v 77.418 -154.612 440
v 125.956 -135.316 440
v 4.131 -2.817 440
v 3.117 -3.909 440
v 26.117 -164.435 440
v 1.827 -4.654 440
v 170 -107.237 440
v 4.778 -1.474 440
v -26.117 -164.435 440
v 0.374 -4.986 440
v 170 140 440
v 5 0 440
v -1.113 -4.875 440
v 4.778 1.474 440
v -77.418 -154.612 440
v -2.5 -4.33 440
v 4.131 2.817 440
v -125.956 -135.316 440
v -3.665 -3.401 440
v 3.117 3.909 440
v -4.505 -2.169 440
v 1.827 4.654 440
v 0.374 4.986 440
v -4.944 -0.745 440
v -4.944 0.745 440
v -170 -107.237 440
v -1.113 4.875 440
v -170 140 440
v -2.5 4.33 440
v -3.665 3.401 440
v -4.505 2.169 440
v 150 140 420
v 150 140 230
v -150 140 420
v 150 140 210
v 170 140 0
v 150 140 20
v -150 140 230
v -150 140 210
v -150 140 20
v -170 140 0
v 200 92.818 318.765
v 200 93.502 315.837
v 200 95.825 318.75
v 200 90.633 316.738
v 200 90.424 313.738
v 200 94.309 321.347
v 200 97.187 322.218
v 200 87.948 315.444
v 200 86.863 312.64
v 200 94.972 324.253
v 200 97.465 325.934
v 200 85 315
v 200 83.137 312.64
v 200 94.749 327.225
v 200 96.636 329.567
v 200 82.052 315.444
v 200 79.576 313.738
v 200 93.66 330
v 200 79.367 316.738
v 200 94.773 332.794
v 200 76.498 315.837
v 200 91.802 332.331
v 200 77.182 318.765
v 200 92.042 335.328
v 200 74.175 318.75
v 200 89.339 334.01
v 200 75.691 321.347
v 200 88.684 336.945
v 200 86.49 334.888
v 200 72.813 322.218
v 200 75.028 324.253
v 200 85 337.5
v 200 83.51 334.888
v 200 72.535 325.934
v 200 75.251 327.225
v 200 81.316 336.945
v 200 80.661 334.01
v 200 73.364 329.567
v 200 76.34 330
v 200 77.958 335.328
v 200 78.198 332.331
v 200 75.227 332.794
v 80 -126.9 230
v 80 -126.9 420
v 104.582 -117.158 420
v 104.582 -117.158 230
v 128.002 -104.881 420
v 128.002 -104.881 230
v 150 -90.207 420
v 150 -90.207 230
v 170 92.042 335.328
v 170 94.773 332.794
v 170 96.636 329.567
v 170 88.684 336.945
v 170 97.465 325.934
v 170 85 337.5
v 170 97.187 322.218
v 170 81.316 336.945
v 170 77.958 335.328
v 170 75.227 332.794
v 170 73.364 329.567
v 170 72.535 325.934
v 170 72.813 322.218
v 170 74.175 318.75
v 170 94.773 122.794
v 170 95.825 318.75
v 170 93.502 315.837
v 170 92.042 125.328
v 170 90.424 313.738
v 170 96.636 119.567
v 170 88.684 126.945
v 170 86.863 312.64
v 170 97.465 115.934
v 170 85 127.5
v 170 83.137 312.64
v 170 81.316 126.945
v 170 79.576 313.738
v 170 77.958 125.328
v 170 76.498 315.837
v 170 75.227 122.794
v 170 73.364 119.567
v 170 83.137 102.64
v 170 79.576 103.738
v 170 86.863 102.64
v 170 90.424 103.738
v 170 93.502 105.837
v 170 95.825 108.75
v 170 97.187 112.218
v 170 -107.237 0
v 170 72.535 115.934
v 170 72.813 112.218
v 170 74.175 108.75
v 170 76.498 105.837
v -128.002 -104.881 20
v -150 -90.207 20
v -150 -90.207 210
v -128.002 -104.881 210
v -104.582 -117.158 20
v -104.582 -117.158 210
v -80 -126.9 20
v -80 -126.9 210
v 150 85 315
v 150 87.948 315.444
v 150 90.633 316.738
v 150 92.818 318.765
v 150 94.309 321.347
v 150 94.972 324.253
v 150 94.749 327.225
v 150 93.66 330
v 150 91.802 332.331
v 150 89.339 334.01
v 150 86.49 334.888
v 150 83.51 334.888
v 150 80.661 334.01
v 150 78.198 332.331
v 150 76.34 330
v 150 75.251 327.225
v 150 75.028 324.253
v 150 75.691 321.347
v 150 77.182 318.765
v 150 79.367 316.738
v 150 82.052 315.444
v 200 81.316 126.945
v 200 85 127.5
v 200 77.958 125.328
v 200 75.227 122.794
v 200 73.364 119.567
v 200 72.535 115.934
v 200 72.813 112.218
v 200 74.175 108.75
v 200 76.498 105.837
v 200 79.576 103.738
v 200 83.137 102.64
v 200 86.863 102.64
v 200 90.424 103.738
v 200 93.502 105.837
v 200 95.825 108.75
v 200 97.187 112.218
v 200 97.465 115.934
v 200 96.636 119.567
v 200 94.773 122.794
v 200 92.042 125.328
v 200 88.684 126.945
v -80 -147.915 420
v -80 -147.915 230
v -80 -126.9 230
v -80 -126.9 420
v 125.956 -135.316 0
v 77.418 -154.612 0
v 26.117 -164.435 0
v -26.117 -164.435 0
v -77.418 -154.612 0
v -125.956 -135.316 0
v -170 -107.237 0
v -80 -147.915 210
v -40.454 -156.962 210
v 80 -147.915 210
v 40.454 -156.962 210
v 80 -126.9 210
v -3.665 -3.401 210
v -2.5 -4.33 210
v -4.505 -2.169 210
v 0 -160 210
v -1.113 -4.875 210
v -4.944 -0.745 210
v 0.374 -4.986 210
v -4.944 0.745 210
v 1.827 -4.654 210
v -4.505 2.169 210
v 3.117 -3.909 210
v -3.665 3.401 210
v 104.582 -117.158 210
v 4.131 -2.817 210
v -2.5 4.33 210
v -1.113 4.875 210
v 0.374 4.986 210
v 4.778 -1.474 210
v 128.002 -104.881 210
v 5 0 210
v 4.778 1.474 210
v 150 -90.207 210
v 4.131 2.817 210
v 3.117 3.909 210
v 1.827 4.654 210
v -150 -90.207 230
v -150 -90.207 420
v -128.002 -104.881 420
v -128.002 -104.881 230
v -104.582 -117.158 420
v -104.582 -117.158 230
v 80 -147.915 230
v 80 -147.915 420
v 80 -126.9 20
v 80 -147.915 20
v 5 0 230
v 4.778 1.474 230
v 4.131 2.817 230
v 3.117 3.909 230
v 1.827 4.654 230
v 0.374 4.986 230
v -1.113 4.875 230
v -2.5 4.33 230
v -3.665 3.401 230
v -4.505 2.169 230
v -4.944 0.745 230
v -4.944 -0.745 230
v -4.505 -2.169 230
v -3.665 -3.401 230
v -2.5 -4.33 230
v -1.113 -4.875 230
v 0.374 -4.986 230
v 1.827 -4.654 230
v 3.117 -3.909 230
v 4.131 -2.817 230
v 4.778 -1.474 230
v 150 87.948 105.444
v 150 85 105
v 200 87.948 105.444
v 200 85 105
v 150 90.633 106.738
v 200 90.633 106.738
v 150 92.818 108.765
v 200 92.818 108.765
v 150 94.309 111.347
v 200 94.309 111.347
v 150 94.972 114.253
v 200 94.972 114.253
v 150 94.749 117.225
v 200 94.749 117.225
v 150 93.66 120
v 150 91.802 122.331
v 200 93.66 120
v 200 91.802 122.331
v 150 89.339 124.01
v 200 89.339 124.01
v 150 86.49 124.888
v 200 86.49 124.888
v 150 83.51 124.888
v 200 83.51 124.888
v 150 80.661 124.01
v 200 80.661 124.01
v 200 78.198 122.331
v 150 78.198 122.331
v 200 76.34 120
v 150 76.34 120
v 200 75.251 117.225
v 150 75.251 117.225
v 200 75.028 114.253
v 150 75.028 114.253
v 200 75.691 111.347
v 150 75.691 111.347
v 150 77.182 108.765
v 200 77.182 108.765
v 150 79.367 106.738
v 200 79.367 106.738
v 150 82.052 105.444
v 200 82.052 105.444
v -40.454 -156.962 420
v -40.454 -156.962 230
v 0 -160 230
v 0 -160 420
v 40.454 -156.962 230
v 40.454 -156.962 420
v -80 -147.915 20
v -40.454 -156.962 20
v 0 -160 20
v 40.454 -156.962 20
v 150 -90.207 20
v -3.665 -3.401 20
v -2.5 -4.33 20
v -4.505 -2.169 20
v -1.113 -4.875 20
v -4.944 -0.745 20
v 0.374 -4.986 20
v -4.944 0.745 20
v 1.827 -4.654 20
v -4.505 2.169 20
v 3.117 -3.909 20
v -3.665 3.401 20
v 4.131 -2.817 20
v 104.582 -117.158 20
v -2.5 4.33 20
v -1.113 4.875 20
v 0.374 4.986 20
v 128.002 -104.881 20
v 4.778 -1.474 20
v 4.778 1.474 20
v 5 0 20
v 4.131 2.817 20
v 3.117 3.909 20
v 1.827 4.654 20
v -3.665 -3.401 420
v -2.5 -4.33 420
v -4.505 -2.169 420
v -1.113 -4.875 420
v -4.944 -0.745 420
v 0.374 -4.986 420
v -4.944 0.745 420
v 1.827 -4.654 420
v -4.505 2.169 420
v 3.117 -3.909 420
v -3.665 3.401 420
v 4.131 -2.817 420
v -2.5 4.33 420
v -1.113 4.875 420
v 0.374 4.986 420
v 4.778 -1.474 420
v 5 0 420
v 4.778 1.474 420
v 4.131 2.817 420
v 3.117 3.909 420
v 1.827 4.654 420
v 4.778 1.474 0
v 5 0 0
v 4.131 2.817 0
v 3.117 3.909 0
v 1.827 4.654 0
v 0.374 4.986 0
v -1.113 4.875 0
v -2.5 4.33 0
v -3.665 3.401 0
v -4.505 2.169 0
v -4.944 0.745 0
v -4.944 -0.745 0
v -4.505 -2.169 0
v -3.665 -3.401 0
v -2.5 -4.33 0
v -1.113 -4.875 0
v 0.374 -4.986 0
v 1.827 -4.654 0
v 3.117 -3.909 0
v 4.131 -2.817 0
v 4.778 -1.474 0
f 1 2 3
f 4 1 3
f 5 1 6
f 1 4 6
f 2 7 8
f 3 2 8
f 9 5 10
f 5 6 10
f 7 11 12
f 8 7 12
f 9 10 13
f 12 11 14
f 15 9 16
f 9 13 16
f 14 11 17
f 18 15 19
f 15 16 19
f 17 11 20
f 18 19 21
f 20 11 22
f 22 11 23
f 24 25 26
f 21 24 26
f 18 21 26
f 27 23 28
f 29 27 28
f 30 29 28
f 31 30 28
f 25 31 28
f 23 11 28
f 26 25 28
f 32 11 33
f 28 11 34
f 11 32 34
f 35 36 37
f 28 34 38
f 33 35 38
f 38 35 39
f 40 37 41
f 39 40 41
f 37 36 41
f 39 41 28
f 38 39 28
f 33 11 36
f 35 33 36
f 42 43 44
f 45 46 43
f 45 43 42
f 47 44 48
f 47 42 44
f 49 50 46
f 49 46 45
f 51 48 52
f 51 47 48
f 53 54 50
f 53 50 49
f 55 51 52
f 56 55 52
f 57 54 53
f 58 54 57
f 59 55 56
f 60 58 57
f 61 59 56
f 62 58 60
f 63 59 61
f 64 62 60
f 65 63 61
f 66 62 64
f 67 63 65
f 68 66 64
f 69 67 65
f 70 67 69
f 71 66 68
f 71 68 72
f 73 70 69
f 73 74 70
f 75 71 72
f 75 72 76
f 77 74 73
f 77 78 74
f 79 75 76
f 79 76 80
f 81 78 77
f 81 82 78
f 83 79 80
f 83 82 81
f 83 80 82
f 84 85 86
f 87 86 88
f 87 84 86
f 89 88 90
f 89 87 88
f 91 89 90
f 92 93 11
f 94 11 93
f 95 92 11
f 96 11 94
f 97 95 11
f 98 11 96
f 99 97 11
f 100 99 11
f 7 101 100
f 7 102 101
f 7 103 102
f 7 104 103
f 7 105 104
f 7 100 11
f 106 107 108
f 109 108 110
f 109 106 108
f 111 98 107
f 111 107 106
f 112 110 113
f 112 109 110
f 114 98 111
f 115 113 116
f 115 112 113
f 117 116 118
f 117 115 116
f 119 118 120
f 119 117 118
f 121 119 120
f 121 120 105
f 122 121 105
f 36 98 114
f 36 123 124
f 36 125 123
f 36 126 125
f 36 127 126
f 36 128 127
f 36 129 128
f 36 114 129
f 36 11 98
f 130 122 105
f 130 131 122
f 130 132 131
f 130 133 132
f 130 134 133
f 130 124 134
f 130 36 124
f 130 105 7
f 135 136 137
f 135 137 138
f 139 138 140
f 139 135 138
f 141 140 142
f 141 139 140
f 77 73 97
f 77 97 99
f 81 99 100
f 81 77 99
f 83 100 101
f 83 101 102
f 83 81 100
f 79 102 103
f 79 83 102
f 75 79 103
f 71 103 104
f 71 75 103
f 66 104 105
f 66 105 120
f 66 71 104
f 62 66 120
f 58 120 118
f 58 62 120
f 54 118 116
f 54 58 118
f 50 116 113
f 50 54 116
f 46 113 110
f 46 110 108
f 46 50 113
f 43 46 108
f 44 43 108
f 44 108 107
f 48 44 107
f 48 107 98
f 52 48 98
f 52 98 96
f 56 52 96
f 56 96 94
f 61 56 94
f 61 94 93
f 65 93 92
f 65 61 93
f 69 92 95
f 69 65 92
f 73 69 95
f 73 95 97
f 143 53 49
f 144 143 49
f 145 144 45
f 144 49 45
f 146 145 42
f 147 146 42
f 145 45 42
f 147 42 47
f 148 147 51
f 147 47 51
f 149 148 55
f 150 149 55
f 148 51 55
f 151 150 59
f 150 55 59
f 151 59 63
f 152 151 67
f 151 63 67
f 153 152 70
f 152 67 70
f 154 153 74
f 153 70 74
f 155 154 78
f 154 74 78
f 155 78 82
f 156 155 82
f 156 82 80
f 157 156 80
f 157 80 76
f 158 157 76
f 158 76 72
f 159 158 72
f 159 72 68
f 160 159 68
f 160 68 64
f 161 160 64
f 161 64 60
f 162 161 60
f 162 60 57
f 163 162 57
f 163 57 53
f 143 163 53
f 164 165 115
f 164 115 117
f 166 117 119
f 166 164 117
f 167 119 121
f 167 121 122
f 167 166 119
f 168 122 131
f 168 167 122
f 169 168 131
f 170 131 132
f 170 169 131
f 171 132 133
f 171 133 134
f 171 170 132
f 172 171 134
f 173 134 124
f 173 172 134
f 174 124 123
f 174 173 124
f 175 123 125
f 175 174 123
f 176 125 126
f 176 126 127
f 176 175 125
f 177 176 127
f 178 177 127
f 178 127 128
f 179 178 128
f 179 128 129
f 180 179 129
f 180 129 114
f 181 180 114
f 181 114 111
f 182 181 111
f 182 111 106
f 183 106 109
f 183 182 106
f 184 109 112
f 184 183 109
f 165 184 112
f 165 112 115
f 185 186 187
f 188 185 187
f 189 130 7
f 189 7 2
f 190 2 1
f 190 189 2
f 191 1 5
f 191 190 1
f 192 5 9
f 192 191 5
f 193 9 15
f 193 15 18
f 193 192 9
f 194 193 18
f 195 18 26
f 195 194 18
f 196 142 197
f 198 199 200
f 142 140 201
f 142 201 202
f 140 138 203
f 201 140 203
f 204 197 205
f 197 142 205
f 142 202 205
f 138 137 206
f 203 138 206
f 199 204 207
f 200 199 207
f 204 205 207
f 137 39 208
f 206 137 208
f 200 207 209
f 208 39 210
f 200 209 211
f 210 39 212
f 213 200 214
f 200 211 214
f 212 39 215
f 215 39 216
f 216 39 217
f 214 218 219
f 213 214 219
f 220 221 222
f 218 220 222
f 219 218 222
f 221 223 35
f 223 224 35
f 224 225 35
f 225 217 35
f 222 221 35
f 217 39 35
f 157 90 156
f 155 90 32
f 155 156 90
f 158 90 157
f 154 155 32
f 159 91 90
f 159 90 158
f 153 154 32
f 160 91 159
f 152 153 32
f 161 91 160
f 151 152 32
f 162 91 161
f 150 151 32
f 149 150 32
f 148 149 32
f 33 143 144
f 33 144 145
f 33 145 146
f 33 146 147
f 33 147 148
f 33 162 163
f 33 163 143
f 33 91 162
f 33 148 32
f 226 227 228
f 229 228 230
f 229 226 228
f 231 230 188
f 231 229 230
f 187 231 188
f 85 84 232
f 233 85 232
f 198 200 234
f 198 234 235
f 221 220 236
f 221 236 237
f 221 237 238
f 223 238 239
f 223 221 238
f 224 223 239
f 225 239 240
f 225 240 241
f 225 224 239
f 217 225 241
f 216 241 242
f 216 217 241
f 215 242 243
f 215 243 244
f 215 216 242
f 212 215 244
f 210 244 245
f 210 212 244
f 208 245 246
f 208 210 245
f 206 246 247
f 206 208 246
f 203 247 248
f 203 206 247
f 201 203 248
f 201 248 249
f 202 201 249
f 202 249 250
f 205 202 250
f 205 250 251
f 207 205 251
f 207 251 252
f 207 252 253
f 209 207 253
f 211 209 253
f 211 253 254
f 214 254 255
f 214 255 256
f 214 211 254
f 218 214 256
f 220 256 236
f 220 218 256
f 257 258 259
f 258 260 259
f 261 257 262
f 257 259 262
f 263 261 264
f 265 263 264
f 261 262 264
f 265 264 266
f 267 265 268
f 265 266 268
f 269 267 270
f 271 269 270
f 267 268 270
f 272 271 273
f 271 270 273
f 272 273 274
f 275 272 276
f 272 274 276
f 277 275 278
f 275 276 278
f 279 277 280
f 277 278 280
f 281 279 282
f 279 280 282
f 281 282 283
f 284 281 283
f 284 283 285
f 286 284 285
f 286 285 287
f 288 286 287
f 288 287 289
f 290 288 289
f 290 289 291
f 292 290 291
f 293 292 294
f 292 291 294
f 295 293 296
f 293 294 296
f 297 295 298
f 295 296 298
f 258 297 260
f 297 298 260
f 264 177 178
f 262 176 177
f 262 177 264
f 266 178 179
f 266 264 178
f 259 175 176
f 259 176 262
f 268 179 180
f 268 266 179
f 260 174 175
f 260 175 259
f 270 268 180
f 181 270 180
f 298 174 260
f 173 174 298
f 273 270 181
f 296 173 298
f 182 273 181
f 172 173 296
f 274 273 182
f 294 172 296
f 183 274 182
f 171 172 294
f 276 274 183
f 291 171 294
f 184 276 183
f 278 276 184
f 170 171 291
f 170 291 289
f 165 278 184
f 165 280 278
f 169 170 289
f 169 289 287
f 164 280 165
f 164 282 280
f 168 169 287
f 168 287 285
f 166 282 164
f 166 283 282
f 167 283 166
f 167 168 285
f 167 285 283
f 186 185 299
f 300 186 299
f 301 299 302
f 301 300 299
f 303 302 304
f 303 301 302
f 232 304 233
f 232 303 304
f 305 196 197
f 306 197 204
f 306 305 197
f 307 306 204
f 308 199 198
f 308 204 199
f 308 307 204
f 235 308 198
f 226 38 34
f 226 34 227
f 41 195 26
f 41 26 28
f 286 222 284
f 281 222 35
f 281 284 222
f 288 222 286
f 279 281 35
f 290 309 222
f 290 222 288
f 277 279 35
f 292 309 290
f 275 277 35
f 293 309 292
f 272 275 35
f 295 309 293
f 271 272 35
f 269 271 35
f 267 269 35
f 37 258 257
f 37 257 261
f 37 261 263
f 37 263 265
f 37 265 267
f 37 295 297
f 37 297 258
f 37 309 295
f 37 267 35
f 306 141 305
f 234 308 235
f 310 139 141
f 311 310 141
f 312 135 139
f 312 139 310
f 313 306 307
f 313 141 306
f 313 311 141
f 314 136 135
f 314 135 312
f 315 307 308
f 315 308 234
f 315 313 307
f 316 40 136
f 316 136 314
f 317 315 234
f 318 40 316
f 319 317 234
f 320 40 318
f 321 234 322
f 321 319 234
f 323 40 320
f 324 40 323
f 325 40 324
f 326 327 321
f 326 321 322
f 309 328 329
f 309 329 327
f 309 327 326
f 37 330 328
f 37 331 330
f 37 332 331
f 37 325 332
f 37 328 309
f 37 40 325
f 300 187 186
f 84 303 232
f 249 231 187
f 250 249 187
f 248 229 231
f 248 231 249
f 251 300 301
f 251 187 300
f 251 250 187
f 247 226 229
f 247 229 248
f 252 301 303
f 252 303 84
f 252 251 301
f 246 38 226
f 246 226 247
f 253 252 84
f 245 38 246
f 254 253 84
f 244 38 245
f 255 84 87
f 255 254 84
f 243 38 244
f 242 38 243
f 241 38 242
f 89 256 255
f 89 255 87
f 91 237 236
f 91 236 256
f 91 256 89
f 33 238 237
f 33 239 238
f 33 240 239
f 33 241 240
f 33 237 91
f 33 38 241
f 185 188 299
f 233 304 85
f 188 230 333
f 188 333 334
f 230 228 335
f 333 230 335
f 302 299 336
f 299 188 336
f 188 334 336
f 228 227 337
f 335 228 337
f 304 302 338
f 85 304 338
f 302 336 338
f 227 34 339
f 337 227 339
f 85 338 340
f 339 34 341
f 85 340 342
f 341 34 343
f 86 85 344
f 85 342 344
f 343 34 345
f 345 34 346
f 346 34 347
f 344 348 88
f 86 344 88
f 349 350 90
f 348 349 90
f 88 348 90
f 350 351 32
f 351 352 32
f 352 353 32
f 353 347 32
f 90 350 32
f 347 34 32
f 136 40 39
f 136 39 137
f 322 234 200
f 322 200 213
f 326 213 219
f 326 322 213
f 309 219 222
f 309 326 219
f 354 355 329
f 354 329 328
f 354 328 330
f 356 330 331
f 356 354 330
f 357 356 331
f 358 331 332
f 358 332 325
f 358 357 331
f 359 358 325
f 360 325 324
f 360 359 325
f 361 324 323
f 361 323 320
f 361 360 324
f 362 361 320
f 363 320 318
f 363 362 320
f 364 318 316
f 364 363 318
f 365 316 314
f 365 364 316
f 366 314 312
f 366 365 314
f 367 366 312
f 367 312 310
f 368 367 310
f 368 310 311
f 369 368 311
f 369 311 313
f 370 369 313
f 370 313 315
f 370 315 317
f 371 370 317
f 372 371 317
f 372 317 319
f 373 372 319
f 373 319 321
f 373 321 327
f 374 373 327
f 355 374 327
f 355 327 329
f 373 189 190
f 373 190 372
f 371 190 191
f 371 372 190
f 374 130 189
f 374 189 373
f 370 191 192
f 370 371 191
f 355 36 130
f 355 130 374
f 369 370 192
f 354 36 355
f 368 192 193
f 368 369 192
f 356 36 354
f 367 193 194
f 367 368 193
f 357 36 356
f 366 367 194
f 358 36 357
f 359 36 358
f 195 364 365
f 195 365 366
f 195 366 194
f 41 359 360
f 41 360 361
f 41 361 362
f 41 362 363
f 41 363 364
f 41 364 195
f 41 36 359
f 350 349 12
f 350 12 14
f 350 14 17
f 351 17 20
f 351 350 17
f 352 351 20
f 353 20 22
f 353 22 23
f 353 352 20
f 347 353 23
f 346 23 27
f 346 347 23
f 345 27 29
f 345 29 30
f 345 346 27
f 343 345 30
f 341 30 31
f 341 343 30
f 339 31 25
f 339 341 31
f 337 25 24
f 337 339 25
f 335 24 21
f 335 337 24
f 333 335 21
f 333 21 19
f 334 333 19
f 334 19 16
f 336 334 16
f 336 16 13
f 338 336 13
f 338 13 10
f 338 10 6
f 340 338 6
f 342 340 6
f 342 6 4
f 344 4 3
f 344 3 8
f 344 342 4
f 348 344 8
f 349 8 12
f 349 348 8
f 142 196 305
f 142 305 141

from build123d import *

# Parameters (mm, degrees)
SKETCH1_R           = 5
BOSS_EXTRUDE1_DEPTH = 440
CUT_EXTRUDE2_START  = -420
SKETCH2_R           = 5
CUT_EXTRUDE2_DEPTH  = 420
BOSS_EXTRUDE2_START = -20
SKETCH3_R           = 5
BOSS_EXTRUDE2_DEPTH = 20
BOSS_EXTRUDE3_START = -20
SKETCH4_R           = 5
BOSS_EXTRUDE3_DEPTH = 20
CUT_EXTRUDE3_DEPTH  = 190
CUT_EXTRUDE4_START  = 190
CUT_EXTRUDE4_DEPTH  = 190
SKETCH8_R           = 10
CUT_EXTRUDE5_DEPTH  = 190
BOSS_EXTRUDE4_START = 30
SKETCH9_R           = 12.5
SKETCH9_R_2         = 10
BOSS_EXTRUDE4_DEPTH = 30
BOSS_EXTRUDE5_DEPTH = 440


with BuildPart() as part:
    # Sketch1 → Boss-Extrude1 (new body)
    with BuildSketch(Plane.XY):
        with BuildLine():
            Line((-170, 140), (170, 140))
            Line((170, 140), (170, -100))
            ThreePointArc((170, -100), (0, -160), (-170, -100))
            Line((-170, -100), (-170, 140))
        make_face()
        Circle(SKETCH1_R, mode=Mode.SUBTRACT)
    extrude(amount=BOSS_EXTRUDE1_DEPTH)

    # Sketch2 → Cut-Extrude2 (cut)
    with BuildSketch(Plane.XY.offset(440).offset(CUT_EXTRUDE2_START)):
        with BuildLine():
            Line((150, 140), (-150, 140))
            Line((-150, 140), (-150, -90.207361828))
            ThreePointArc((-150, -90.207361828), (0, -140), (150, -90.207361828))
            Line((150, -90.207361828), (150, 140))
        make_face()
        Circle(SKETCH2_R, mode=Mode.SUBTRACT)
    extrude(amount=CUT_EXTRUDE2_DEPTH, mode=Mode.SUBTRACT)

    # Sketch3 → Boss-Extrude2 (add)
    with BuildSketch(Plane.XY.offset(440).offset(BOSS_EXTRUDE2_START)):
        with BuildLine():
            Line((-150, 140), (-150, -90.207361828))
            ThreePointArc((-150, -90.207361828), (0, -140), (150, -90.207361828))
            Line((150, -90.207361828), (150, 140))
            Line((150, 140), (-150, 140))
        make_face()
        Circle(SKETCH3_R, mode=Mode.SUBTRACT)
    extrude(amount=BOSS_EXTRUDE2_DEPTH)

    # Sketch4 → Boss-Extrude3 (add)
    with BuildSketch(Plane.XY.offset(230).offset(BOSS_EXTRUDE3_START)):
        with BuildLine():
            Line((-170, 140), (-170, -100))
            ThreePointArc((-170, -100), (0, -160), (170, -100))
            Line((170, -100), (170, 140))
            Line((170, 140), (-170, 140))
        make_face()
        Circle(SKETCH4_R, mode=Mode.SUBTRACT)
    extrude(amount=BOSS_EXTRUDE3_DEPTH)

    # Sketch6 → Cut-Extrude3 (cut)
    with BuildSketch(Plane.XY.offset(230)):
        with BuildLine():
            Line((-80, -157.872832651), (-80, -126.403399298))
            ThreePointArc((-80, -126.403399298), (0, -139.528938804), (80, -126.403399298))
            Line((80, -126.403399298), (80, -157.872832651))
            ThreePointArc((80, -157.872832651), (0, -169.528938804), (-80, -157.872832651))
        make_face()
    extrude(amount=CUT_EXTRUDE3_DEPTH, mode=Mode.SUBTRACT)

    # Sketch7 → Cut-Extrude4 (cut)
    with BuildSketch(Plane(origin=(0, 0, 210), x_dir=(-1, 0, 0), z_dir=(0, 0, -1)).offset(CUT_EXTRUDE4_START)):
        with BuildLine():
            Line((-80, -126.900469714), (-80, -160.673360289))
            ThreePointArc((-80, -160.673360289), (0, -172.214162118), (80, -160.673360289))
            Line((80, -160.673360289), (80, -126.900469714))
            ThreePointArc((80, -126.900469714), (0, -140), (-80, -126.900469714))
        make_face()
    extrude(amount=-CUT_EXTRUDE4_DEPTH, mode=Mode.SUBTRACT)

    # Sketch8 → Cut-Extrude5 (cut)
    with BuildSketch(Plane(origin=(170, 0, 0), x_dir=(0, 0, -1), z_dir=(1, 0, 0))):
        with Locations((-325, 85)):
            Circle(SKETCH8_R)
        with Locations((-115, 85)):
            Circle(SKETCH8_R)
    extrude(amount=-CUT_EXTRUDE5_DEPTH, mode=Mode.SUBTRACT)

    # Sketch9 → Boss-Extrude4 (add)
    # profile 1 of 2: a face of its own
    with BuildSketch(Plane(origin=(170, 0, 0), x_dir=(0, 0, -1), z_dir=(1, 0, 0)).offset(BOSS_EXTRUDE4_START)):
        with Locations(Location((-325, 85, 0), (0, 0, 180))):
            Circle(SKETCH9_R)
        with Locations((-325, 85)):
            Circle(SKETCH9_R_2, mode=Mode.SUBTRACT)
    # profile 2 of 2: a face of its own
    with BuildSketch(Plane(origin=(170, 0, 0), x_dir=(0, 0, -1), z_dir=(1, 0, 0)).offset(BOSS_EXTRUDE4_START)):
        with Locations(Location((-115, 85, 0), (0, 0, 180))):
            Circle(SKETCH9_R)
        with Locations((-115, 85)):
            Circle(SKETCH9_R_2, mode=Mode.SUBTRACT)
    extrude(amount=-BOSS_EXTRUDE4_DEPTH)

    # Sketch10 → Boss-Extrude5 (add)
    with BuildSketch(Plane(origin=(0, 0, 0), x_dir=(-1, 0, 0), z_dir=(0, 0, -1))):
        with BuildLine():
            Line((-170, -100), (-170, -107.237017076))
            ThreePointArc((-170, -107.237017076), (0, -165.671056736), (170, -107.237017076))
            Line((170, -107.237017076), (170, -100))
            ThreePointArc((170, -100), (0, -160), (-170, -100))
        make_face()
    extrude(amount=-BOSS_EXTRUDE5_DEPTH)


solid = part.part
